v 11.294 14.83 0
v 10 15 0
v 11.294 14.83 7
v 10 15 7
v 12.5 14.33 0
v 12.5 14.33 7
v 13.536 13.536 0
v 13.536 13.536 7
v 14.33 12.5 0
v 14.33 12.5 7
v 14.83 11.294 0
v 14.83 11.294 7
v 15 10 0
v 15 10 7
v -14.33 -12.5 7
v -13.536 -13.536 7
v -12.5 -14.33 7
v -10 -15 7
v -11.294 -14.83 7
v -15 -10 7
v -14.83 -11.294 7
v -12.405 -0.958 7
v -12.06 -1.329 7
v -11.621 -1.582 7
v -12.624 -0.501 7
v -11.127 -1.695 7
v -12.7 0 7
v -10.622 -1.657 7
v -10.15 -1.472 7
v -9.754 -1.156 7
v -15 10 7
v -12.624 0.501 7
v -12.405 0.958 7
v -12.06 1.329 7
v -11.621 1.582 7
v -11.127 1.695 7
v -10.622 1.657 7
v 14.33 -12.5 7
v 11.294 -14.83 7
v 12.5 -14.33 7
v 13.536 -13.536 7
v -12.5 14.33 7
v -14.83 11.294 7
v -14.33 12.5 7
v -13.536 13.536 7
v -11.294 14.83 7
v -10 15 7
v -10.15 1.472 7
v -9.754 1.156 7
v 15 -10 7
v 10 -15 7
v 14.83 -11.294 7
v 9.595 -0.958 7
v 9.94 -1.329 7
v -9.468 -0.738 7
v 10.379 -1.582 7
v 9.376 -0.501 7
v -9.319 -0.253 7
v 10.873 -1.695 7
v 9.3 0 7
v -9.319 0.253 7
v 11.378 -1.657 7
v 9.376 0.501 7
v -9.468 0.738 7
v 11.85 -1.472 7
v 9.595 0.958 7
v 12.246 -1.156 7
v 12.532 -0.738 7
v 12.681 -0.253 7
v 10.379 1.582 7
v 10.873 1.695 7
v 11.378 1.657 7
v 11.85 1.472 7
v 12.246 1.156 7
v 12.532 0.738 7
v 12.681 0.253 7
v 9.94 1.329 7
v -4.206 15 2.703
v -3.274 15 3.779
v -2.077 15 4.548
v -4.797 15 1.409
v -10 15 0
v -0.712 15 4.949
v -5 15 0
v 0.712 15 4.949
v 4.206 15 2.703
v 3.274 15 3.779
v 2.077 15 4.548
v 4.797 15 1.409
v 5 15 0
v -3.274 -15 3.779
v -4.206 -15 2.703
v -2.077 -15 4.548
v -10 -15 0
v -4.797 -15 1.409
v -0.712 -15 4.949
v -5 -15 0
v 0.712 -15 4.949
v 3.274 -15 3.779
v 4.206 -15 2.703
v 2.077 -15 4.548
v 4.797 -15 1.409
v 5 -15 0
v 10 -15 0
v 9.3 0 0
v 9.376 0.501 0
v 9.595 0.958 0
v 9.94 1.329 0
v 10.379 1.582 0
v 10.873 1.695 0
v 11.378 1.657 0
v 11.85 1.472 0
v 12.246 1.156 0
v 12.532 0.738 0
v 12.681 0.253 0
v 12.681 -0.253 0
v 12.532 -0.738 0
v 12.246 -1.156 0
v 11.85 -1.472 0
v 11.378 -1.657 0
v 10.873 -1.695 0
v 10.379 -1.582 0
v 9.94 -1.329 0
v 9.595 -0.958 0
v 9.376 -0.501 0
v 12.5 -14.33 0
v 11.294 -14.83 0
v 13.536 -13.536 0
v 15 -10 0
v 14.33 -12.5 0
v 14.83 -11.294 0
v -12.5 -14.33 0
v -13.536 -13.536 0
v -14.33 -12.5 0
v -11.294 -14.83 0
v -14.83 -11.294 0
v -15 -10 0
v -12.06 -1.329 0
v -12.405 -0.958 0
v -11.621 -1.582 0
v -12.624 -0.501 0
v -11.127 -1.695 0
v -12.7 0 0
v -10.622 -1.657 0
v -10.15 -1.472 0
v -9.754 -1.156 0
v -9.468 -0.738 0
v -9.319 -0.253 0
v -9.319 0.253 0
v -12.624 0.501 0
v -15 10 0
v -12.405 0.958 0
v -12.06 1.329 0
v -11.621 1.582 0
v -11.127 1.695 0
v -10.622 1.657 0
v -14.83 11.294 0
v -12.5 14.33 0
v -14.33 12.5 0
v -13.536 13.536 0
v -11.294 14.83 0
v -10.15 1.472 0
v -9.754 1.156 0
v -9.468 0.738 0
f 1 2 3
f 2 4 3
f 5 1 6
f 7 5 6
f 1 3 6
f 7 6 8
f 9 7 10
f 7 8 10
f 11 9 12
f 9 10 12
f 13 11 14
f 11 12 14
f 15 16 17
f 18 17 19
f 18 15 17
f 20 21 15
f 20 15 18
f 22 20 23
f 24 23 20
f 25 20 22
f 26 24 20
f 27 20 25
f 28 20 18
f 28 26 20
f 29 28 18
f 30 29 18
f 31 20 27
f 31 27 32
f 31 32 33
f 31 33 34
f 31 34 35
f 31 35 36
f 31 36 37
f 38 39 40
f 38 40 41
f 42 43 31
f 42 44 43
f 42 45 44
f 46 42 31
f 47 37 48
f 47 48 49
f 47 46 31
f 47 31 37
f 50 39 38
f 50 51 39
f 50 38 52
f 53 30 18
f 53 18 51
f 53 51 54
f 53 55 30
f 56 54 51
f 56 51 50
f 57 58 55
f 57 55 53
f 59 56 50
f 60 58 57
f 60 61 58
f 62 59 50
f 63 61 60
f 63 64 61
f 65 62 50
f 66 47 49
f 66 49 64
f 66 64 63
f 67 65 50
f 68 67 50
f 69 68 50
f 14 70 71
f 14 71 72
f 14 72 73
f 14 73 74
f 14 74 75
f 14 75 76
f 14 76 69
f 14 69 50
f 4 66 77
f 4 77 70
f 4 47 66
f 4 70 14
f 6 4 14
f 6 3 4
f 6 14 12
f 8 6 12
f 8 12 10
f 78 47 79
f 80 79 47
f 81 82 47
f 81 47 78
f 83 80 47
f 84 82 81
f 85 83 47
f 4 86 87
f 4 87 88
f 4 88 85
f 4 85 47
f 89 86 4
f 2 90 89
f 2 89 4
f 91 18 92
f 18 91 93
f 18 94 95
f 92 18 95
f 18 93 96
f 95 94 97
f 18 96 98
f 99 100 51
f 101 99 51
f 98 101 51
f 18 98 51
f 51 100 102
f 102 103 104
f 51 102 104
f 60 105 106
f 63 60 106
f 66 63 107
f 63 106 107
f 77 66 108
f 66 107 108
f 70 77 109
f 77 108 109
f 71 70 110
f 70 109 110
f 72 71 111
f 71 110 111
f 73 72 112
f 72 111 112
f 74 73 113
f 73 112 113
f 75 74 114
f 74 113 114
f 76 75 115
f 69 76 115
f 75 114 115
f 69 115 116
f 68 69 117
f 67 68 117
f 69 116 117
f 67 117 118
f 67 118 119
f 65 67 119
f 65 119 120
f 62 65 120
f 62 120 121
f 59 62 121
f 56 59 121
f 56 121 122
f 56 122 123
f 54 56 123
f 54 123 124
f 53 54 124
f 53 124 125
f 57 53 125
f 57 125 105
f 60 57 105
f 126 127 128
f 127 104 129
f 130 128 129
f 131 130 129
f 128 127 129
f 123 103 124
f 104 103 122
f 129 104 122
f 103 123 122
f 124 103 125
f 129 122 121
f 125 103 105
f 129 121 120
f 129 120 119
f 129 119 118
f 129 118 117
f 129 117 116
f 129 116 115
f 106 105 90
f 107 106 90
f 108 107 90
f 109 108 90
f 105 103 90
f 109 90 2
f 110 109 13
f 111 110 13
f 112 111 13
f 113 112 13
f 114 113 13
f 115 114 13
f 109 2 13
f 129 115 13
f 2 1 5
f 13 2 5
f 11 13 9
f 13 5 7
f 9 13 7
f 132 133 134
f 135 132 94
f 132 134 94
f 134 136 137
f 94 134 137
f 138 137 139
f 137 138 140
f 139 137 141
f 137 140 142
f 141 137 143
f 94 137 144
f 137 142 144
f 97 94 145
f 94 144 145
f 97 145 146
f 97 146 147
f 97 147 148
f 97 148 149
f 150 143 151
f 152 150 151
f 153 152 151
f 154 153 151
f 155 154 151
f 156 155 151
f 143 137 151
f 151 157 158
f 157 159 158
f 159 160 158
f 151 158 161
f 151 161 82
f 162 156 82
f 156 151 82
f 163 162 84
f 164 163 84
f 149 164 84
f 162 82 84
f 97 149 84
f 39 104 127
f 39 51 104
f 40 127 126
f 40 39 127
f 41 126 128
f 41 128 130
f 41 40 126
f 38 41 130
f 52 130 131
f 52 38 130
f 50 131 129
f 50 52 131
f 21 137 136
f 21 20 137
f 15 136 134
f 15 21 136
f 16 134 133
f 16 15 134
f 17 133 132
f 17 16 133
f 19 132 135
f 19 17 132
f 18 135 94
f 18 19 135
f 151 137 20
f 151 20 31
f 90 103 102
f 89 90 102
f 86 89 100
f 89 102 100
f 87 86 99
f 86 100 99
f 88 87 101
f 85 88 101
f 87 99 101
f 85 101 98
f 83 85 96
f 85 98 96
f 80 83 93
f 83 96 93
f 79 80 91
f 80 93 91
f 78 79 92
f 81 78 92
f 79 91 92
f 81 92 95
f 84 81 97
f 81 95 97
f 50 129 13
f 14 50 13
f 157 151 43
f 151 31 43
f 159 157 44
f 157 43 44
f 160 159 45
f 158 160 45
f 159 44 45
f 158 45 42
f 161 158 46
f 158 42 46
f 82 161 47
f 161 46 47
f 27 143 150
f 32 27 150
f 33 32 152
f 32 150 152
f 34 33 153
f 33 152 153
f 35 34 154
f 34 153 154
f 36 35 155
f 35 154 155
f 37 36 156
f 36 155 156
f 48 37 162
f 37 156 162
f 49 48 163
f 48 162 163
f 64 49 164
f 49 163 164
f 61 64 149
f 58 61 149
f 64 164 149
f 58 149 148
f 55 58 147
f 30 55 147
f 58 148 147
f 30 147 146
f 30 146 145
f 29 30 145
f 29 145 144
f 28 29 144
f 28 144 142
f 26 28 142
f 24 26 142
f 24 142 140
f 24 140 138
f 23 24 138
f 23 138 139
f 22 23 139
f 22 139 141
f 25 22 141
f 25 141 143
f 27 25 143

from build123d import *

# Parameters (mm, degrees)
F0_W     = 30
F0_H     = 30
F1_DEPTH = 7
F3_D     = 3.4
F5_DEPTH = 30
F6_R     = 5


with BuildPart() as f1:
    # F0 (on Top) → F1 (new body)
    with BuildSketch(Plane.XY):
        Rectangle(F0_W, F0_H)
    extrude(amount=F1_DEPTH)

    # F3 (through all)
    with Locations(Plane.XY.offset(7)):
        with Locations((-11, 0), (11, 0)):
            Hole(F3_D / 2)

    # F4 (on face) → F5 (cut, through all)
    with BuildSketch(Plane.XZ.offset(15)):
        with BuildLine():
            Line((-5, 0), (5, 0))
            ThreePointArc((5, 0), (0, 5), (-5, 0))
        make_face()
    extrude(amount=-F5_DEPTH, mode=Mode.SUBTRACT)

    # F6
    f6_edges = [f1.edges().sort_by_distance(p)[0] for p in [
        (15, -15, 3.5),
        (-15, -15, 3.5),
        (15, 15, 3.5),
        (-15, 15, 3.5),
    ]]
    fillet(f6_edges, radius=F6_R)


solid = f1.part
